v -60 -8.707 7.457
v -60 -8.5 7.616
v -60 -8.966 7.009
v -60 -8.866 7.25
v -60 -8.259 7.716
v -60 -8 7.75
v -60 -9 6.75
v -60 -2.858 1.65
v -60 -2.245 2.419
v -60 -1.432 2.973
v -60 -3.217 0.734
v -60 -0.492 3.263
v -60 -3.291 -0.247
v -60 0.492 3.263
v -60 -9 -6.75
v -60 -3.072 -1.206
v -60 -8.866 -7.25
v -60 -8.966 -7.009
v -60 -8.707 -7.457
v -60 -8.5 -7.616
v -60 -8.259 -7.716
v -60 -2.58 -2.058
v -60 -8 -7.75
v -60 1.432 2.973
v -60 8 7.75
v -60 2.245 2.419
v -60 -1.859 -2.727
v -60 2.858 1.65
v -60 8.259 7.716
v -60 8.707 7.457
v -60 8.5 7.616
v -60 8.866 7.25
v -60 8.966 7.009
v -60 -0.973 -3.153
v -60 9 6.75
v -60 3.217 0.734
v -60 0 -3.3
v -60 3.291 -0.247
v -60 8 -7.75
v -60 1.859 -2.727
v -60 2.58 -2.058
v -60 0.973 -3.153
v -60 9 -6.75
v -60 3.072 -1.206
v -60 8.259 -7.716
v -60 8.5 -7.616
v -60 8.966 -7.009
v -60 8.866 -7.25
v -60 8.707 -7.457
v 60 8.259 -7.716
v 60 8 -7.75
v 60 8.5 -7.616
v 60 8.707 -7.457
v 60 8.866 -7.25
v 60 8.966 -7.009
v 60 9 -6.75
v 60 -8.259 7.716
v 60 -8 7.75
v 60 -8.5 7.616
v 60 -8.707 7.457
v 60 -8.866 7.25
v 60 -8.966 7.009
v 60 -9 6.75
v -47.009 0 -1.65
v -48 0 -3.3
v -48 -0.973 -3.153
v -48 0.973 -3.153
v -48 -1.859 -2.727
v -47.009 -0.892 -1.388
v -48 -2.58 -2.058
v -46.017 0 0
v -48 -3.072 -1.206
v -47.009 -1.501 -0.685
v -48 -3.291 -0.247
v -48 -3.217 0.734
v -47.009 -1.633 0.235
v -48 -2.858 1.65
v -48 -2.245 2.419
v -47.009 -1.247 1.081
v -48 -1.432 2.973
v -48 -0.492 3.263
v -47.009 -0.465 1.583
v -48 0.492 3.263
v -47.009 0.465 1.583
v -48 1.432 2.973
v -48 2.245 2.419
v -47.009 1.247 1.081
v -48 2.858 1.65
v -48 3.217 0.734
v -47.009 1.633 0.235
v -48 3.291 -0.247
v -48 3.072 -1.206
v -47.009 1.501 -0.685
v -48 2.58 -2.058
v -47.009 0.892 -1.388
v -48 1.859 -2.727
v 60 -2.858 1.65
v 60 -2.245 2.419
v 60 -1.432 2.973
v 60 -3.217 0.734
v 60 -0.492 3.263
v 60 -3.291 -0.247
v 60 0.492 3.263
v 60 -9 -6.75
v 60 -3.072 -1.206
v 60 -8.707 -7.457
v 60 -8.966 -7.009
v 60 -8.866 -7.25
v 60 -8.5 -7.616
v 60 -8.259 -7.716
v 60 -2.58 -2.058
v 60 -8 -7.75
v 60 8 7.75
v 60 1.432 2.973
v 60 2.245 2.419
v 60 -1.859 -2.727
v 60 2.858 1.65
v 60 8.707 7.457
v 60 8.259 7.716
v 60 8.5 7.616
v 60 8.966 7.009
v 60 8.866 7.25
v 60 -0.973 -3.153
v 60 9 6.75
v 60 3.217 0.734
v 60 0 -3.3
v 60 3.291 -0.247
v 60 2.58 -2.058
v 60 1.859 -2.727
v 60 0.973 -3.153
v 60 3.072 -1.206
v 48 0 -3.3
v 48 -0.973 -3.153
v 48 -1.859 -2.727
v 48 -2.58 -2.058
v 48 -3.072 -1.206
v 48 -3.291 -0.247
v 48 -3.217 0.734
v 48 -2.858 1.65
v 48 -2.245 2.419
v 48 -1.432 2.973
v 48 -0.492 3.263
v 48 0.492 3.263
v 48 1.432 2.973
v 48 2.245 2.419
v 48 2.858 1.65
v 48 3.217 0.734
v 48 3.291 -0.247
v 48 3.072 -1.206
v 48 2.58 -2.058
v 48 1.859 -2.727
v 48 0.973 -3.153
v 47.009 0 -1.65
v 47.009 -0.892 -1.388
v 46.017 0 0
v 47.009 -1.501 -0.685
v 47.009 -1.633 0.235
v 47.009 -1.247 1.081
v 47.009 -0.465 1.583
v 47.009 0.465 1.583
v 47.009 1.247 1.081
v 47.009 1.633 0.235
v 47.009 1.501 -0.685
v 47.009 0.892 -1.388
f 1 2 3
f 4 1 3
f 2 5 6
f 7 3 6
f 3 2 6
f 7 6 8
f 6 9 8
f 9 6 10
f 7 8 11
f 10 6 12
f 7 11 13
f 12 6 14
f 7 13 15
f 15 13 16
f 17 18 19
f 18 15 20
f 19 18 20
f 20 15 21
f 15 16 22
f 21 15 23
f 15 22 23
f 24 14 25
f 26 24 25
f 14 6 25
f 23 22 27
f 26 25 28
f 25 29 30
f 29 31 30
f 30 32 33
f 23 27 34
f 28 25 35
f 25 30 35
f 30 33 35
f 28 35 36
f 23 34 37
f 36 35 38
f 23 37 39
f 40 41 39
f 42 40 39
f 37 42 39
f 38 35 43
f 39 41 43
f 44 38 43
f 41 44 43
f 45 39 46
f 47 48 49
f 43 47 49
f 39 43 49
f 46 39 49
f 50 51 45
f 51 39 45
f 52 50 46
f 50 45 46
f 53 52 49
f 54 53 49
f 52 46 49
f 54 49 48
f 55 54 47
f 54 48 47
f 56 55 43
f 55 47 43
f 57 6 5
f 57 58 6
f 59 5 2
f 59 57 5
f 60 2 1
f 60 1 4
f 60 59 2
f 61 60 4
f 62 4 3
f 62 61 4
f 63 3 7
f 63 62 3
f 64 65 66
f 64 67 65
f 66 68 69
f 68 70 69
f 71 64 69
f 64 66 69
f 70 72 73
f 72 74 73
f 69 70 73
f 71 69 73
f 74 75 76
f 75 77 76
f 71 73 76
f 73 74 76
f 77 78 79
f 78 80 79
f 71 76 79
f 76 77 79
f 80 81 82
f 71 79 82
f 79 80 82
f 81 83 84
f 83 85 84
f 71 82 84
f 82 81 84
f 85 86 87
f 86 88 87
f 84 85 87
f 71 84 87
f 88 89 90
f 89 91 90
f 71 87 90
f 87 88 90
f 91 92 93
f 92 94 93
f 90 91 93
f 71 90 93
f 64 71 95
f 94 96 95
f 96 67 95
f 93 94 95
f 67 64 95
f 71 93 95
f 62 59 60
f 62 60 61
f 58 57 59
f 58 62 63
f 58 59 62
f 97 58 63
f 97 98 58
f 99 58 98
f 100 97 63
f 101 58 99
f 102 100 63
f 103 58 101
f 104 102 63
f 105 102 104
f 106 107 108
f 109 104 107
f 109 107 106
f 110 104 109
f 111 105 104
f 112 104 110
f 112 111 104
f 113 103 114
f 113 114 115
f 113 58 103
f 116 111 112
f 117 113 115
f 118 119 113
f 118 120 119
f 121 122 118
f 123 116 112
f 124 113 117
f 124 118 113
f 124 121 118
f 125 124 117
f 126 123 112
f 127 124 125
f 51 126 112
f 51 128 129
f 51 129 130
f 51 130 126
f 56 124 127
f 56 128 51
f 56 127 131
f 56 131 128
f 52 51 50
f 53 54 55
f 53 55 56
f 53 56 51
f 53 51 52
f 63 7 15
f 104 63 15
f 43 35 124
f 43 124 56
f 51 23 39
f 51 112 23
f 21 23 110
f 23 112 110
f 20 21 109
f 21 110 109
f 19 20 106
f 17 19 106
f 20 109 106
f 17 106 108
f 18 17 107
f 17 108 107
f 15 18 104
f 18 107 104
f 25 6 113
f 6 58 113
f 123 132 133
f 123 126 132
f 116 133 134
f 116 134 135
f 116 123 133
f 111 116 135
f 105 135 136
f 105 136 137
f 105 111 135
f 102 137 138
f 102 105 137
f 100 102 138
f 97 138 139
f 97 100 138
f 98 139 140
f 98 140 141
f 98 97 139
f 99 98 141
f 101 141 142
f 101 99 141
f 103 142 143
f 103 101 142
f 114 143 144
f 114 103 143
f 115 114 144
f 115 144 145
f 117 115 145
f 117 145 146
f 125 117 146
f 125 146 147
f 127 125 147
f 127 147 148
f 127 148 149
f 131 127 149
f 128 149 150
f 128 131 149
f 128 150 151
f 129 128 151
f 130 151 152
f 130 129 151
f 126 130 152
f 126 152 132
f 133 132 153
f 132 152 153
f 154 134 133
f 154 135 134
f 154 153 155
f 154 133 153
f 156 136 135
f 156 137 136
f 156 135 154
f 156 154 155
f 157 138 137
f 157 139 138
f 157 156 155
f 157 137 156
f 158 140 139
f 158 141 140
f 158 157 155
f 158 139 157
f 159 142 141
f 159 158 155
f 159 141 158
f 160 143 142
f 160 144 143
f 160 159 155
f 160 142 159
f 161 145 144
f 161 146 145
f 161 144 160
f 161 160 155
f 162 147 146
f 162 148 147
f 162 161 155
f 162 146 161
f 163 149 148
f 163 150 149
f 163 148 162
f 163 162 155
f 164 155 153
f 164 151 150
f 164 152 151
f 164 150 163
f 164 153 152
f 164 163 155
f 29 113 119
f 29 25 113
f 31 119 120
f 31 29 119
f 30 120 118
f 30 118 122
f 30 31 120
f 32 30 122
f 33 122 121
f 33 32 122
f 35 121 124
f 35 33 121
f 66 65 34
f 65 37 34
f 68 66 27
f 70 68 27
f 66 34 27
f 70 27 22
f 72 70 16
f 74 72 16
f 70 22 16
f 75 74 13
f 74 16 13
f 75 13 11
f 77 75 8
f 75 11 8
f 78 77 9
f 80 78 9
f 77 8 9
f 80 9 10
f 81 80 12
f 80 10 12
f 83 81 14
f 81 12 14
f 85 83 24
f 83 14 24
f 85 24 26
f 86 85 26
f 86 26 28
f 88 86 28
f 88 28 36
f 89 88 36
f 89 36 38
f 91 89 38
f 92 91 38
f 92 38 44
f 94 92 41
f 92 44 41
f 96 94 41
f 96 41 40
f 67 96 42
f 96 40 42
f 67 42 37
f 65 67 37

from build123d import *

# Parameters (mm, degrees)
SKETCH1_W           = 15.5
SKETCH1_H           = 18
BOSS_EXTRUDE1_DEPTH = 60
FILLET1_R           = 1


with BuildPart() as part:
    # Sketch1 → Boss-Extrude1 (new body, symmetric)
    with BuildSketch(Plane(origin=(0, 0, 0), x_dir=(0, 0, -1), z_dir=(1, 0, 0))):
        Rectangle(SKETCH1_W, SKETCH1_H)
    extrude(amount=BOSS_EXTRUDE1_DEPTH, both=True)

    # Fillet1
    fillet1_edges = [part.edges().sort_by_distance(p)[0] for p in [
        (0, -9, -7.75),
        (0, -9, 7.75),
        (0, 9, 7.75),
        (0, 9, -7.75),
    ]]
    fillet(fillet1_edges, radius=FILLET1_R)

    # Sketch3 → Ø1.0 (6.6) Diameter Hole1 (revolve, cut)
    with BuildSketch(Plane(origin=(60, 0, 0), x_dir=(0, 0, -1), z_dir=(0, 1, 0))):
        Polygon((0, 0), (0, 13.982840043), (3.3, 12), (3.3, 0), align=None)
    f_1_0_6_6_diameter_hole1 = revolve(axis=Axis((66.35, 0, 0), (-1, 0, 0)), mode=Mode.SUBTRACT)

    # Mirror1: Ø1.0 (6.6) Diameter Hole1 across plane
    add(f_1_0_6_6_diameter_hole1.mirror(Plane(origin=(0, 0, 0), x_dir=(0, 0, 1), z_dir=(1, 0, 0))), mode=Mode.SUBTRACT)


solid = part.part
